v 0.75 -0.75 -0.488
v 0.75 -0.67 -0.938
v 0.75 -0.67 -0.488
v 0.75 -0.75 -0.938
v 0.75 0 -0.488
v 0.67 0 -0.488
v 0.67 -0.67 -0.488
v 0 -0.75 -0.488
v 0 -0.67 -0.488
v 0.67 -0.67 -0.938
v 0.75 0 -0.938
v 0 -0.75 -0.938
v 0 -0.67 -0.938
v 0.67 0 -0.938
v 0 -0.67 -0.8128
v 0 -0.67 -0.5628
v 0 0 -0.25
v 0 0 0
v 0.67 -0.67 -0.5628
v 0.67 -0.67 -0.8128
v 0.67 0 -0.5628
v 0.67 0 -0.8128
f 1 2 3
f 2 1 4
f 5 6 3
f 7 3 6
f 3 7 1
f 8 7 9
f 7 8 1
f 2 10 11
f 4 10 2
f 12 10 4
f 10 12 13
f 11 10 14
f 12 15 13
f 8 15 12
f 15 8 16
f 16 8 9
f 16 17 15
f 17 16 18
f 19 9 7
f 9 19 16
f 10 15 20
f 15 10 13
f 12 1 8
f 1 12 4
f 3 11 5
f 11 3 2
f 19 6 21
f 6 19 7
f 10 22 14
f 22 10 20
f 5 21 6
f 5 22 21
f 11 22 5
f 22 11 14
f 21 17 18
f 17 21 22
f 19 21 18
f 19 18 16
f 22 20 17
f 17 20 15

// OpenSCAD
// file: lib/lodge_kit.scad
// Lodge shell tile kit — shared dimensions and modules.
//
// The game paints a lodge footprint in 5 m cells and resolves the
// exterior from these tiles at half-cell (2.5 m) resolution; see
// internal/world/lodge_shell.go. Every tile is authored in the same
// canonical frame:
//
//   * origin on the lodge floor plane (Z = 0);
//   * wall-type tiles sit on a footprint edge, centred on it, with the
//     OUTSIDE toward SCAD −Y (game +Z) and the wall thickness toward +Y;
//   * roof tiles are centred on a half-cell, with Z = 0 at the tile's
//     lowest corner; slopes fall toward −Y (game +Z);
//   * corner tiles sit on a grid vertex; an outer corner's building is
//     in the SCAD (−X, +Y) quadrant, an inner corner's notch in (+X, −Y).
//
// Colours are near-neutral: the renderer tints walls and roofs per lodge
// from a seeded palette (world.ShellPalette).
//
// Keep these in sync with the constants in lodge_shell.go.

tile   = 2.5;   // ShellTileSize
wall_h = 5.0;   // ShellWallHeight
rise   = 2.1;   // ShellRoofRise, per tile of run
pitch  = rise / tile;

wall_t   = 0.35;  // wall thickness
sink     = 1.5;   // walls run this far below the floor to hide pad grading
roof_t   = 0.25;  // roof slab thickness
overhang = 0.7;   // eaves overhang past the wall plane

c_wall   = [0.92, 0.90, 0.86];
c_stone  = [0.62, 0.61, 0.60];
c_trim   = [0.97, 0.97, 0.95];
c_glass  = [0.30, 0.42, 0.52];
c_door   = [0.36, 0.25, 0.18];
c_roof   = [0.97, 0.97, 0.97];
c_fascia = [0.55, 0.52, 0.50];

// Plain wall panel: timber above a stone plinth, a trim band under the
// eaves.
module wall_panel() {
    color(c_wall)
        translate([-tile/2, 0, -sink]) cube([tile, wall_t, wall_h + sink]);
    color(c_stone)
        translate([-tile/2, -0.06, -sink]) cube([tile, wall_t, sink + 0.7]);
    color(c_trim)
        translate([-tile/2, -0.04, wall_h - 0.3]) cube([tile, 0.1, 0.3]);
    battens();
}

// Horizontal board lines above the plinth.
module battens() {
    color(c_wall * 0.8)
        for (z = [1.3 : 0.6 : wall_h - 0.6])
            translate([-tile/2, -0.03, z]) cube([tile, 0.04, 0.06]);
}

// A framed pane on the outer face. x0/w along the wall, z0/h up it.
module pane(x0, w, z0, h) {
    color(c_trim)
        translate([x0 - 0.1, -0.05, z0 - 0.1]) cube([w + 0.2, 0.06, h + 0.2]);
    color(c_glass)
        translate([x0, -0.08, z0]) cube([w, 0.06, h]);
}

module wall_window() {
    wall_panel();
    pane(-0.7, 1.4, 1.4, 2.2);
    color(c_trim) translate([-0.02, -0.1, 1.4]) cube([0.04, 0.04, 2.2]); // mullion
}

// Tall window flanked by shutters.
module wall_window_alt() {
    wall_panel();
    pane(-0.5, 1.0, 1.2, 2.8);
    color(c_door) {
        translate([-1.0, -0.1, 1.2]) cube([0.4, 0.05, 2.8]);
        translate([ 0.6, -0.1, 1.2]) cube([0.4, 0.05, 2.8]);
    }
}

// Floor-to-eave glazing for food courts: a low stone sill, then glass in
// three lights.
module wall_glazed() {
    color(c_wall)
        translate([-tile/2, 0, -sink]) cube([tile, wall_t, wall_h + sink]);
    color(c_stone)
        translate([-tile/2, -0.06, -sink]) cube([tile, wall_t, sink + 0.35]);
    color(c_glass)
        translate([-tile/2, -0.09, 0.35]) cube([tile, 0.06, wall_h - 0.75]);
    color(c_trim) {
        for (x = [-tile/2, -tile/6, tile/6, tile/2 - 0.08])
            translate([x, -0.12, 0.35]) cube([0.08, 0.06, wall_h - 0.75]);
        translate([-tile/2, -0.12, wall_h - 0.45]) cube([tile, 0.07, 0.1]);
    }
}

// Glazed entry door under a small canopy, with a step.
module door() {
    color(c_wall)
        translate([-tile/2, 0, -sink]) cube([tile, wall_t, wall_h + sink]);
    color(c_stone)
        translate([-tile/2, -0.06, -sink]) cube([tile, wall_t, sink + 0.15]);
    battens();
    color(c_door)
        translate([-0.9, -0.1, 0]) cube([1.8, 0.1, 2.7]);
    color(c_glass) {
        translate([-0.75, -0.13, 0.9]) cube([0.65, 0.05, 1.6]);
        translate([ 0.10, -0.13, 0.9]) cube([0.65, 0.05, 1.6]);
    }
    color(c_trim)
        translate([-tile/2, -0.04, wall_h - 0.3]) cube([tile, 0.1, 0.3]);
    color(c_roof)   // canopy
        translate([-1.2, -1.3, 3.0])
            rotate([-12, 0, 0]) cube([2.4, 1.3, 0.12]);
    color(c_stone)  // step
        translate([-1.1, -0.9, -0.3]) cube([2.2, 0.9, 0.42]);
}

module corner_outer() {
    color(c_stone)
        translate([-0.3, -0.05, -sink]) cube([0.35, 0.35, wall_h + sink - 0.3]);
}

module corner_inner() {
    color(c_trim)
        translate([0, -0.12, 0]) cube([0.12, 0.12, wall_h - 0.3]);
}

// Roof slab over one half-cell. h lists corner heights (in rise units)
// in SCAD order (−X,+Y), (+X,+Y), (+X,−Y), (−X,−Y); split names which
// diagonal the top surface folds along: 0 through corners 0–2, 1
// through corners 1–3.
module roof_tile(h, split) {
    p = [[-tile/2, tile/2], [tile/2, tile/2], [tile/2, -tile/2], [-tile/2, -tile/2]];
    top = [for (i = [0:3]) [p[i][0], p[i][1], h[i] * rise]];
    bot = [for (i = [0:3]) [p[i][0], p[i][1], h[i] * rise - roof_t]];
    tris = split == 0 ? [[0, 1, 2], [0, 2, 3]] : [[0, 1, 3], [1, 2, 3]];
    color(c_roof)
        polyhedron(
            points = concat(top, bot),
            faces = concat(
                // top (clockwise seen from above = outward in OpenSCAD)
                [for (t = tris) [t[0], t[1], t[2]]],
                [for (t = tris) [t[2] + 4, t[1] + 4, t[0] + 4]],
                [for (i = [0:3]) [i, i + 4, (i + 1) % 4 + 4, (i + 1) % 4]]
            ));
}

// Eaves strip past a wall edge: continues the roof plane outward and
// down, finished with a fascia board.
module eave() {
    drop = overhang * pitch;
    color(c_roof)
        polyhedron(
            points = [
                [-tile/2, 0, 0], [tile/2, 0, 0], [tile/2, -overhang, -drop], [-tile/2, -overhang, -drop],
                [-tile/2, 0, -roof_t], [tile/2, 0, -roof_t], [tile/2, -overhang, -drop - roof_t], [-tile/2, -overhang, -drop - roof_t],
            ],
            faces = [[0, 1, 2, 3], [7, 6, 5, 4], [0, 4, 5, 1], [1, 5, 6, 2], [2, 6, 7, 3], [3, 7, 4, 0]]);
    color(c_fascia)
        translate([-tile/2, -overhang - 0.05, -drop - roof_t - 0.1]) cube([tile, 0.08, roof_t + 0.2]);
}

// Eaves in the square past an outer corner: a hip folding along the
// diagonal away from the building.
module eave_corner() {
    o = overhang;
    d = o * pitch;
    color(c_roof)
        polyhedron(
            points = [
                [0, 0, 0], [o, 0, -d], [o, -o, -d], [0, -o, -d],
                [0, 0, -roof_t], [o, 0, -d - roof_t], [o, -o, -d - roof_t], [0, -o, -d - roof_t],
            ],
            faces = [[0, 1, 2], [0, 2, 3], [6, 5, 4], [7, 6, 4], [0, 4, 5, 1], [1, 5, 6, 2], [2, 6, 7, 3], [3, 7, 4, 0]]);
    color(c_fascia) {
        translate([0, -o - 0.05, -d - roof_t - 0.1]) cube([o + 0.05, 0.08, roof_t + 0.2]);
        translate([o - 0.03, -o - 0.05, -d - roof_t - 0.1]) cube([0.08, o + 0.05, roof_t + 0.2]);
    }
}

module chimney() {
    color(c_stone)
        translate([-0.55, -0.55, -1.0]) cube([1.1, 1.1, rise + 3.0]);
    color(c_fascia)
        translate([-0.65, -0.65, rise + 1.8]) cube([1.3, 1.3, 0.2]);
}
// main file
// Lodge shell kit: eaves past an outer corner. See lib/lodge_kit.scad.
include <lib/lodge_kit.scad>
eave_corner();
